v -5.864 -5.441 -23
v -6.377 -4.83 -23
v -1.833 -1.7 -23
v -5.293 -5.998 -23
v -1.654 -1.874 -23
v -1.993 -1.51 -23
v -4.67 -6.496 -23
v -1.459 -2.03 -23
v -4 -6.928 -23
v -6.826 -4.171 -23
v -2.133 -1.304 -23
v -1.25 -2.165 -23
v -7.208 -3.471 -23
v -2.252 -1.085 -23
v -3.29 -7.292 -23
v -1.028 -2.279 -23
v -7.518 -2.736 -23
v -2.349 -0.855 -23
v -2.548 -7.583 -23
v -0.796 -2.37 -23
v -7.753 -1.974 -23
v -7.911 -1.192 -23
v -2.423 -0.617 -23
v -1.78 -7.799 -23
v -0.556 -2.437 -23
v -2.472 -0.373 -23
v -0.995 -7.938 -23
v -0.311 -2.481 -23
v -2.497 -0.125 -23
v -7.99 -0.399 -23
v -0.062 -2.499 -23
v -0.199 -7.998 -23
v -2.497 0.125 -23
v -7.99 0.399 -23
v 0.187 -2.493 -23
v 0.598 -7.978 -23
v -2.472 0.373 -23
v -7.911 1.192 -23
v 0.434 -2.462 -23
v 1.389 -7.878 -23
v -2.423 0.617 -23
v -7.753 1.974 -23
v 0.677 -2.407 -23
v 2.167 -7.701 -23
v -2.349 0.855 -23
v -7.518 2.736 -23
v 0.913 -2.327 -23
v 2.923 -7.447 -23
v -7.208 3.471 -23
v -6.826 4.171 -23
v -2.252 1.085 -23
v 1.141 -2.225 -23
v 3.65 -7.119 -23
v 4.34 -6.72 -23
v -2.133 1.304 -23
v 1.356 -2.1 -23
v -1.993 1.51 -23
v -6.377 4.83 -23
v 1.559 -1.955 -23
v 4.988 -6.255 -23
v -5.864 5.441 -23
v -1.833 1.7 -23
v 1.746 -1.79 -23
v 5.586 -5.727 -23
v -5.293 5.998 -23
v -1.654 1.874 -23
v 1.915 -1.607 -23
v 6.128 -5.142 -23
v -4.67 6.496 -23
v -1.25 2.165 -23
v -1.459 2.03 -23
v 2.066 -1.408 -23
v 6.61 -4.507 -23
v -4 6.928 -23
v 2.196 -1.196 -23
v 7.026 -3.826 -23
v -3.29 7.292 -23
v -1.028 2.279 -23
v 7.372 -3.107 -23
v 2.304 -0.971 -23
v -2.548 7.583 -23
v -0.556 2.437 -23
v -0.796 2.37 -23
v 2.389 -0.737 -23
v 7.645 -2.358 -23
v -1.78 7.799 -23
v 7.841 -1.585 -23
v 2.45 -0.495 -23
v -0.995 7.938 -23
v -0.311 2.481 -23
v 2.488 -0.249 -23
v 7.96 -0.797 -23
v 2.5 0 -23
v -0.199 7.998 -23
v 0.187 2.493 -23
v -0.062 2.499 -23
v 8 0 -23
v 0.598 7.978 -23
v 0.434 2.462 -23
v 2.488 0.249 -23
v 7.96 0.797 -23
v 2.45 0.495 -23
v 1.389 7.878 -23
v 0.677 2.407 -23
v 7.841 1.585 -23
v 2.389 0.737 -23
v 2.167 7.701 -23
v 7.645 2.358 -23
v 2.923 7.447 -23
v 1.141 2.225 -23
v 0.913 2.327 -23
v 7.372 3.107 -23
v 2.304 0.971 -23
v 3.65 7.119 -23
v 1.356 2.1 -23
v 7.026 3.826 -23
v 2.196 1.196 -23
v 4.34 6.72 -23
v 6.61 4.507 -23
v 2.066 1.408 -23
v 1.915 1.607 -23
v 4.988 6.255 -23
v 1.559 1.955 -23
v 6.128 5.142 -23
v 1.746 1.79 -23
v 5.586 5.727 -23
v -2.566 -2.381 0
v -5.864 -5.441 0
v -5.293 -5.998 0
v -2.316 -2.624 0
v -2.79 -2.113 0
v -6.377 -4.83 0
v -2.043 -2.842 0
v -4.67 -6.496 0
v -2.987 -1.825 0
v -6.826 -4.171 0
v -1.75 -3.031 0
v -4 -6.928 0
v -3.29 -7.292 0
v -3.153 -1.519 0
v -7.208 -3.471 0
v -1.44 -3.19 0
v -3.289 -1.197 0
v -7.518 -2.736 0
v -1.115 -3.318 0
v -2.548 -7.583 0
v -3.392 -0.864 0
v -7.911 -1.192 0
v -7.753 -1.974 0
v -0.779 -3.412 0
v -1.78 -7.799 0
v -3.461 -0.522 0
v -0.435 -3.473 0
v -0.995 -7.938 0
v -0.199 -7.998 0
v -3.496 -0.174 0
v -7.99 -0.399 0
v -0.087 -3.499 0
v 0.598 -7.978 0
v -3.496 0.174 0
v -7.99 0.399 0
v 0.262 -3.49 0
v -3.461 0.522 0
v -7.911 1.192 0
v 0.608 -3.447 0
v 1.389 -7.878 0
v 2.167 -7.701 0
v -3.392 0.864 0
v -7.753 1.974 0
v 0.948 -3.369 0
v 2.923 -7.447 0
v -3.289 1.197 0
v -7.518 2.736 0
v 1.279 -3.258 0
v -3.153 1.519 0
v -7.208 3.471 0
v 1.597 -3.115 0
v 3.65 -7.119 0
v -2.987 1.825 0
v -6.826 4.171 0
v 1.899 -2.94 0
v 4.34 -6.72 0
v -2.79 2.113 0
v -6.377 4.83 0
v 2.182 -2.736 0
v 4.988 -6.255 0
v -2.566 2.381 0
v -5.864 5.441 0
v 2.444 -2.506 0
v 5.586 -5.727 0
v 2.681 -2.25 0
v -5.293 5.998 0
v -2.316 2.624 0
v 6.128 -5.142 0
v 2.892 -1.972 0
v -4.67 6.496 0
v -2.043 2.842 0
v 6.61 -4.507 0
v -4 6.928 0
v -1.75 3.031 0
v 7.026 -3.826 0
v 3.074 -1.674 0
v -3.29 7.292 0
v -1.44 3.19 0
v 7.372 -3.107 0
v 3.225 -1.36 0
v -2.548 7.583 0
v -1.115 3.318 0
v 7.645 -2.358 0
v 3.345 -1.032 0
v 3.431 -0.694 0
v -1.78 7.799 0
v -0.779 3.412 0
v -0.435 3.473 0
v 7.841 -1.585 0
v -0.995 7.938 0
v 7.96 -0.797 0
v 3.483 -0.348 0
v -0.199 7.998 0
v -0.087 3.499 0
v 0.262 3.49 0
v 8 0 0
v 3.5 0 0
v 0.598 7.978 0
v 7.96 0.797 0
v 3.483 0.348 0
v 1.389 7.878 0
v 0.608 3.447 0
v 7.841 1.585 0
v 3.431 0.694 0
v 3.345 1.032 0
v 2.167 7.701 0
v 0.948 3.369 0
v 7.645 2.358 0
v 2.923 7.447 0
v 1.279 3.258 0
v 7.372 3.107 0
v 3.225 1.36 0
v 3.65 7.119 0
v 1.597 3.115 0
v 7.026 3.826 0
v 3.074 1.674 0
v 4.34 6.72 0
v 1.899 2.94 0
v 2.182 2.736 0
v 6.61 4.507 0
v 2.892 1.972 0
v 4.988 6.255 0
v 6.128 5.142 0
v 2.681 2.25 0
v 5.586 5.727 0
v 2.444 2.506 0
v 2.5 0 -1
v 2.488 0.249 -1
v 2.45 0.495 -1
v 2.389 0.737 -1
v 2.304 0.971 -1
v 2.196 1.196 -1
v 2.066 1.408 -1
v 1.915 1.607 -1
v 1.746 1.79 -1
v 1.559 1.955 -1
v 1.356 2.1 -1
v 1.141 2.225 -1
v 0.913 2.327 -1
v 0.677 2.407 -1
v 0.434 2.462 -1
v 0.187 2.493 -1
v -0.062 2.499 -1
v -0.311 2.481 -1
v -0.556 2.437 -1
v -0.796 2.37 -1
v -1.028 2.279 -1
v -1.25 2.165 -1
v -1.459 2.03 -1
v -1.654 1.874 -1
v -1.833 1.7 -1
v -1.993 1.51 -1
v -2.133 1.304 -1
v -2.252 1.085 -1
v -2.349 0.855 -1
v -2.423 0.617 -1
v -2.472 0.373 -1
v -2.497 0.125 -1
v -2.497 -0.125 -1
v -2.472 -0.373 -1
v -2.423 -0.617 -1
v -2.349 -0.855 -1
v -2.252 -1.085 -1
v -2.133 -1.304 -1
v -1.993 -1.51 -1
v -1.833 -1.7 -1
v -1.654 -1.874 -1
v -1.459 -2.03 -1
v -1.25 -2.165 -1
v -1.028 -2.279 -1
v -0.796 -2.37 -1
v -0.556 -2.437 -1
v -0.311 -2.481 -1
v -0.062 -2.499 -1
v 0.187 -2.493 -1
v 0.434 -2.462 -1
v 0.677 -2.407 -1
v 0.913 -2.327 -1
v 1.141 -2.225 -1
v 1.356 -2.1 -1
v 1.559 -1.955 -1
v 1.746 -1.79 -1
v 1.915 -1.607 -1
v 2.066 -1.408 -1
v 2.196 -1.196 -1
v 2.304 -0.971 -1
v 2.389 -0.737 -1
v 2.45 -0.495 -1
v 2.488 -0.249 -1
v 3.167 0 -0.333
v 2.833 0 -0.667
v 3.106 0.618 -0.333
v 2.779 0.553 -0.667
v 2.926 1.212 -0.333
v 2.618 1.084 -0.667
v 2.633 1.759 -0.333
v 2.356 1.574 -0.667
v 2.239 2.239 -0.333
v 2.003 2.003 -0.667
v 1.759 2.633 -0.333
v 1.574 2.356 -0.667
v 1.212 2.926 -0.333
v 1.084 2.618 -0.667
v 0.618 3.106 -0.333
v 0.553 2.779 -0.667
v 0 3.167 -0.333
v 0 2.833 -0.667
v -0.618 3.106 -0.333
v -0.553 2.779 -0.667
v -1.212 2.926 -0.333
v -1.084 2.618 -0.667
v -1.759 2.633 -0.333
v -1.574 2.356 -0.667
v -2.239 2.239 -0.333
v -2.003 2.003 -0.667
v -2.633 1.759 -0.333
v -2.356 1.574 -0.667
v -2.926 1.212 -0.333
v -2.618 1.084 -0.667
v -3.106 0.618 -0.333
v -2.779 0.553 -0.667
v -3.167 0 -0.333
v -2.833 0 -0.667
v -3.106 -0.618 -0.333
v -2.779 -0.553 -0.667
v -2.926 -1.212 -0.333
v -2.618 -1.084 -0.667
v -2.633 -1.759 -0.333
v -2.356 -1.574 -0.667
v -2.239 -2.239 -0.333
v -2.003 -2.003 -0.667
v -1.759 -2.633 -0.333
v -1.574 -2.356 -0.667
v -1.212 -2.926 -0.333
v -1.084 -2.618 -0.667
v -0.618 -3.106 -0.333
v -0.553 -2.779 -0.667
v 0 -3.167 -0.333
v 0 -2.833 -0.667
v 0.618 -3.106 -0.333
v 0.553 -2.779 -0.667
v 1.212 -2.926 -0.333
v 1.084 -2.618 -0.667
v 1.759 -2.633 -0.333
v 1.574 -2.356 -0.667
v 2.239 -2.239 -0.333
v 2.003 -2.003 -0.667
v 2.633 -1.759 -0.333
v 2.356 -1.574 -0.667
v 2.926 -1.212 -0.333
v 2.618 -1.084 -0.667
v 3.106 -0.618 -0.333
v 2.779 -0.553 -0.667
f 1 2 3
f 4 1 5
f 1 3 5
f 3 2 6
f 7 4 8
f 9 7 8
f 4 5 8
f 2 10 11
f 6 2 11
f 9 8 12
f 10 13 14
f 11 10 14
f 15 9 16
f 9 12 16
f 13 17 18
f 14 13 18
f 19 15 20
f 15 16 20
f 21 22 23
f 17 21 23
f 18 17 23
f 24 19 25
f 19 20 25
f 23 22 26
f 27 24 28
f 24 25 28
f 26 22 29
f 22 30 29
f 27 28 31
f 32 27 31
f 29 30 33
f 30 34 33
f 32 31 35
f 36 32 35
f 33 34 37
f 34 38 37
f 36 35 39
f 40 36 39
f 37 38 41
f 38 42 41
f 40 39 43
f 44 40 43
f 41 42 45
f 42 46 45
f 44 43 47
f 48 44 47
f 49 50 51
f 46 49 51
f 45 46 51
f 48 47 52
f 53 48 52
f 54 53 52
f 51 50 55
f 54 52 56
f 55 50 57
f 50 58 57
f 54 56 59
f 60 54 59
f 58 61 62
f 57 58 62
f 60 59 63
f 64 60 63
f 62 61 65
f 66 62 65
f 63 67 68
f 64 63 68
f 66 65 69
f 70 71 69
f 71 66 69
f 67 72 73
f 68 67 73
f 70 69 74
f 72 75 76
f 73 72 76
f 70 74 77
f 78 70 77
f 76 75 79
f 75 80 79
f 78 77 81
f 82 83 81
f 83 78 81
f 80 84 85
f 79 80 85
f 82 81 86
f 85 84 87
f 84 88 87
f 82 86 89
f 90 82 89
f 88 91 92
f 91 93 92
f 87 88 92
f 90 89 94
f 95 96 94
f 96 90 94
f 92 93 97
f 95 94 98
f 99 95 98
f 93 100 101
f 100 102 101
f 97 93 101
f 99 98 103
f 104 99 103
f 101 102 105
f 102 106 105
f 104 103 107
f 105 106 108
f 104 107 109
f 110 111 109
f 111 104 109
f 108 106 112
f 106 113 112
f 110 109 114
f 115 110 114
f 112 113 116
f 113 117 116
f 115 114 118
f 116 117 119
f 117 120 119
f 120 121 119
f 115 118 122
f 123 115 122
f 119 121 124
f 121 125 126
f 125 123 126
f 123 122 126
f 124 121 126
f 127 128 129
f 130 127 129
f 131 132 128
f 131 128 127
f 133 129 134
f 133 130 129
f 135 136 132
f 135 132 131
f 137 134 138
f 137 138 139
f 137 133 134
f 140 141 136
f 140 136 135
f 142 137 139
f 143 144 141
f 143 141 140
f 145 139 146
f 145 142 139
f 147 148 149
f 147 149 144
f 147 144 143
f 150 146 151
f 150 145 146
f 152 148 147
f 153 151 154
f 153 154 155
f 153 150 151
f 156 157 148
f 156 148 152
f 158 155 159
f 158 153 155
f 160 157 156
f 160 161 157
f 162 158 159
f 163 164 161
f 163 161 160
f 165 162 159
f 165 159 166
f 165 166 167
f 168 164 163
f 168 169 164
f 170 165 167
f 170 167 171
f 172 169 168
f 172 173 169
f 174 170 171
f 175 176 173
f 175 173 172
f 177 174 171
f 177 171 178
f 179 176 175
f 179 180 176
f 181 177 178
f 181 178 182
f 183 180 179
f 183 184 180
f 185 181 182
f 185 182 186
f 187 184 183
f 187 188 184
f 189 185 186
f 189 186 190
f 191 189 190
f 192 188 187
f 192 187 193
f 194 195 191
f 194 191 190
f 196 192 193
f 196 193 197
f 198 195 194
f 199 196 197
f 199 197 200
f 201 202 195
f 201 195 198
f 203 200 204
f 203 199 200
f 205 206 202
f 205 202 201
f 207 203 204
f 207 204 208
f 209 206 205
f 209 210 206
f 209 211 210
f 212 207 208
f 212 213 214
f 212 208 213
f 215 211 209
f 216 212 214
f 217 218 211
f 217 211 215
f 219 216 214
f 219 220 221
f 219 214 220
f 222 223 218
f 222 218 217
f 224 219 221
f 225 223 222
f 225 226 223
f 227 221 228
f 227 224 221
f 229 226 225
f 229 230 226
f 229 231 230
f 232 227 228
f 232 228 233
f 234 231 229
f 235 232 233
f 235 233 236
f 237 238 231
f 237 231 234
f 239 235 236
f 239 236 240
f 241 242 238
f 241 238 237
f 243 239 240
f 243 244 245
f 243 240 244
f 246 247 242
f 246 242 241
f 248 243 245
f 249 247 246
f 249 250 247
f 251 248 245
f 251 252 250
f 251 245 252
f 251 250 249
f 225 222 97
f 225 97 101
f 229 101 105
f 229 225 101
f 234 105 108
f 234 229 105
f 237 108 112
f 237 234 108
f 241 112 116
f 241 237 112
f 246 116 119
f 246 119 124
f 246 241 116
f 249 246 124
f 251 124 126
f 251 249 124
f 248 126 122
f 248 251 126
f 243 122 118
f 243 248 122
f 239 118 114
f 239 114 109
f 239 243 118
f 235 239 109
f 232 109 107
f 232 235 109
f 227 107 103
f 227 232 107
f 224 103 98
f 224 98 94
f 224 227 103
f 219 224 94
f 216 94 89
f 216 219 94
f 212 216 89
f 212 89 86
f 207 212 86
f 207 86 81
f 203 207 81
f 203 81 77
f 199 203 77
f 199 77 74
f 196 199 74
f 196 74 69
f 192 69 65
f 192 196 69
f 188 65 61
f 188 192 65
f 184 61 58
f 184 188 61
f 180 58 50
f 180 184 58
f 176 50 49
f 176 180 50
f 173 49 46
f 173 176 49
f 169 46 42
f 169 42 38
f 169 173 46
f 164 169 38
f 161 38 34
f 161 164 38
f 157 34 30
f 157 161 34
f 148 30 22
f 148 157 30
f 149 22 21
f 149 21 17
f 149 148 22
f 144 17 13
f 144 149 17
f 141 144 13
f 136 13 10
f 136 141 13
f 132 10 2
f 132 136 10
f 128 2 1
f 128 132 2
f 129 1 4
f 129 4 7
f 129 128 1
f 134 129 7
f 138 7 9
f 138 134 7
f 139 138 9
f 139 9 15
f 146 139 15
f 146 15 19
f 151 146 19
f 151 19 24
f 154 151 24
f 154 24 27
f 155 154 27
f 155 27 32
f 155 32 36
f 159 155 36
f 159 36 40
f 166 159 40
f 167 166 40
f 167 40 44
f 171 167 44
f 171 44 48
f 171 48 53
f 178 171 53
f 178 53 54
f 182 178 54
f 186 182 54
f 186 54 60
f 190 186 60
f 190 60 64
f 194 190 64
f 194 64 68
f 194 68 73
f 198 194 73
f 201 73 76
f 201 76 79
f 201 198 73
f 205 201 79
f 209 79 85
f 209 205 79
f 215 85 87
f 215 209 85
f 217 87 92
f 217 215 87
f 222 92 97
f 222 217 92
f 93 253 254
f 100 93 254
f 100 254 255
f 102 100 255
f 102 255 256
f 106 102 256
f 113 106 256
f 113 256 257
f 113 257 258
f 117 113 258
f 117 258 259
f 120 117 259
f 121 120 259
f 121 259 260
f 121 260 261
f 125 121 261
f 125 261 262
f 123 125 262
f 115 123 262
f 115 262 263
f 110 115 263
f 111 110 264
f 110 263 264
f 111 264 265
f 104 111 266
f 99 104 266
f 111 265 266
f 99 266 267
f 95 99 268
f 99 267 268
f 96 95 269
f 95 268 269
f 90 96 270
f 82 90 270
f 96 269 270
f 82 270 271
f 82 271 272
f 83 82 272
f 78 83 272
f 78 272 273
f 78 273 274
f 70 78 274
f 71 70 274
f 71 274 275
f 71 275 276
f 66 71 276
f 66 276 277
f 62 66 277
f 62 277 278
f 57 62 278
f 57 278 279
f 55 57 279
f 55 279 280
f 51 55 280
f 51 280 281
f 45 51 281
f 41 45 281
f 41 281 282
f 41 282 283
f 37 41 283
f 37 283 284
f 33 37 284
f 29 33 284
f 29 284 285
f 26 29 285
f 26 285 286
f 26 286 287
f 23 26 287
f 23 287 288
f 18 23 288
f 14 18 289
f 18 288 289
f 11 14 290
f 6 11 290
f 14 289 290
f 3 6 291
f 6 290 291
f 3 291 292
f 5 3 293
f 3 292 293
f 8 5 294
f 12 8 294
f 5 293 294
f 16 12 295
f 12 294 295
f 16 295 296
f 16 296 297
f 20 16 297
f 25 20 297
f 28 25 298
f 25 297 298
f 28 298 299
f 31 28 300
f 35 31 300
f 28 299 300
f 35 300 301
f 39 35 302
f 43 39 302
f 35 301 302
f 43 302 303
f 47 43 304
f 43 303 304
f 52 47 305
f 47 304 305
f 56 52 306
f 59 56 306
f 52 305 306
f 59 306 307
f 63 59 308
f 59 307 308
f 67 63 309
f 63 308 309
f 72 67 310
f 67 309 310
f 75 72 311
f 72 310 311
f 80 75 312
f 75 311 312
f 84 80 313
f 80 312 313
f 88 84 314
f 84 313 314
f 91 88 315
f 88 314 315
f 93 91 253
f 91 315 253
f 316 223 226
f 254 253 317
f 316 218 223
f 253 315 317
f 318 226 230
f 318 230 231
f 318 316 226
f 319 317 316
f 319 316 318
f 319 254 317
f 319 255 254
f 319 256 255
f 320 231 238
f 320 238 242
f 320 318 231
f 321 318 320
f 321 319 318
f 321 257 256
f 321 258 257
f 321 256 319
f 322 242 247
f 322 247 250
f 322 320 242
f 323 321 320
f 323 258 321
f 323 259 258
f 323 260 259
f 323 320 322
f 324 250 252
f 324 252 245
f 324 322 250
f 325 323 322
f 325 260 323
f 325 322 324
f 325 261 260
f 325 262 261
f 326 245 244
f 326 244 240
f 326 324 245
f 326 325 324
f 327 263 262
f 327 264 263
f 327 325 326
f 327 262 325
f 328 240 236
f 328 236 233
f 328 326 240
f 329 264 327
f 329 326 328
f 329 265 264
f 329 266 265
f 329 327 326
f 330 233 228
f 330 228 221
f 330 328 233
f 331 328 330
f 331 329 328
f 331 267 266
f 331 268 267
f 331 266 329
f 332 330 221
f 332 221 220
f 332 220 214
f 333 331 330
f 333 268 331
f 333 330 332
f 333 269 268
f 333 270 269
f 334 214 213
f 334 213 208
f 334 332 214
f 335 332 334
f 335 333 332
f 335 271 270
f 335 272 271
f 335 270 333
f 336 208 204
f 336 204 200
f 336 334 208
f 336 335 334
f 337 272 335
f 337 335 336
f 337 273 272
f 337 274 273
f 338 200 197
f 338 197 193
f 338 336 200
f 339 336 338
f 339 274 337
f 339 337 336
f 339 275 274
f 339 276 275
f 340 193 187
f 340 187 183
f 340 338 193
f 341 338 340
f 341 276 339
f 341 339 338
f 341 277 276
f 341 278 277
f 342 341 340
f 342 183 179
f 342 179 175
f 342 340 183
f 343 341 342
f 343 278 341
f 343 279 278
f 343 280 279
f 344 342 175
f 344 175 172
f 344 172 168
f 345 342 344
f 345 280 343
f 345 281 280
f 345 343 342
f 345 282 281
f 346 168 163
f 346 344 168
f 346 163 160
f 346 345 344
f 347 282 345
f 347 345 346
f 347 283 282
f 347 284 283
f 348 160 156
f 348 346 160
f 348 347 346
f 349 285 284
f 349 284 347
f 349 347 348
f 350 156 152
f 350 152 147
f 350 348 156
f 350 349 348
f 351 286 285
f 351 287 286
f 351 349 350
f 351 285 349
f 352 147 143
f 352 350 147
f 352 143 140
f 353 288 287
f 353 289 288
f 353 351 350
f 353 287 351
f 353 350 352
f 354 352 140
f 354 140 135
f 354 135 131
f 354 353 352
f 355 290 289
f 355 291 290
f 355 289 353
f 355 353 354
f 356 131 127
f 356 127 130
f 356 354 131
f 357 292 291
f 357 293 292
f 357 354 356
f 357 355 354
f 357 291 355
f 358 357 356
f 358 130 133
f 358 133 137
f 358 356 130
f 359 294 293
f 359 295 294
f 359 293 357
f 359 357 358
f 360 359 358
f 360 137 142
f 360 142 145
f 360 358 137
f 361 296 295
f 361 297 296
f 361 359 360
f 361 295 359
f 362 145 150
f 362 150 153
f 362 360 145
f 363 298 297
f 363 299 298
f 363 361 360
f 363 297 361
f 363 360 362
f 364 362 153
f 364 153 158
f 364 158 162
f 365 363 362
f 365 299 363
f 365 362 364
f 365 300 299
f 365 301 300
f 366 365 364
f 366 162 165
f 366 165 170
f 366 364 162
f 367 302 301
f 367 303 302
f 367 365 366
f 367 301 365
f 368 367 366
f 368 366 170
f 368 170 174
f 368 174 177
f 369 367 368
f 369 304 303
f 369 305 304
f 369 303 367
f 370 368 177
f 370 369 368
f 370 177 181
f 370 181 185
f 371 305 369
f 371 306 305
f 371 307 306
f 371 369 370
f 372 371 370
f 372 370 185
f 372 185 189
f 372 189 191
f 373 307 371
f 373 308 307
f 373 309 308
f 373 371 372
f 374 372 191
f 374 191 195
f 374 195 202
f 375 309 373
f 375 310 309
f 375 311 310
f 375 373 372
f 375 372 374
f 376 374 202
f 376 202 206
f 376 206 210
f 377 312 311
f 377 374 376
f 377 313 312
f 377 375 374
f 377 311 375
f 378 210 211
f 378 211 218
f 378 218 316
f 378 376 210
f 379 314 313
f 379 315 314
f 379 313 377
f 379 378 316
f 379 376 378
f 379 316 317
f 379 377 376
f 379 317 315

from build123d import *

# Parameters (mm, degrees)
F0_R     = 8
F1_DEPTH = 23
F2_T     = -5.5
F3_SIZE  = 1


with BuildPart() as f1:
    # F0 (on Top) → F1 (new body)
    with BuildSketch(Plane.XY):
        Circle(F0_R)
    extrude(amount=-F1_DEPTH)

    # F2
    f2_openings = [f1.faces().sort_by_distance(p)[0] for p in [
        (0, 0, 0),
        (0, 0, -23),
    ]]
    offset(amount=F2_T, openings=f2_openings)

    # F3
    f3_edges = [f1.edges().sort_by_distance(p)[0] for p in [
        (-2.5, 0, 0),
    ]]
    chamfer(f3_edges, length=F3_SIZE)


solid = f1.part
